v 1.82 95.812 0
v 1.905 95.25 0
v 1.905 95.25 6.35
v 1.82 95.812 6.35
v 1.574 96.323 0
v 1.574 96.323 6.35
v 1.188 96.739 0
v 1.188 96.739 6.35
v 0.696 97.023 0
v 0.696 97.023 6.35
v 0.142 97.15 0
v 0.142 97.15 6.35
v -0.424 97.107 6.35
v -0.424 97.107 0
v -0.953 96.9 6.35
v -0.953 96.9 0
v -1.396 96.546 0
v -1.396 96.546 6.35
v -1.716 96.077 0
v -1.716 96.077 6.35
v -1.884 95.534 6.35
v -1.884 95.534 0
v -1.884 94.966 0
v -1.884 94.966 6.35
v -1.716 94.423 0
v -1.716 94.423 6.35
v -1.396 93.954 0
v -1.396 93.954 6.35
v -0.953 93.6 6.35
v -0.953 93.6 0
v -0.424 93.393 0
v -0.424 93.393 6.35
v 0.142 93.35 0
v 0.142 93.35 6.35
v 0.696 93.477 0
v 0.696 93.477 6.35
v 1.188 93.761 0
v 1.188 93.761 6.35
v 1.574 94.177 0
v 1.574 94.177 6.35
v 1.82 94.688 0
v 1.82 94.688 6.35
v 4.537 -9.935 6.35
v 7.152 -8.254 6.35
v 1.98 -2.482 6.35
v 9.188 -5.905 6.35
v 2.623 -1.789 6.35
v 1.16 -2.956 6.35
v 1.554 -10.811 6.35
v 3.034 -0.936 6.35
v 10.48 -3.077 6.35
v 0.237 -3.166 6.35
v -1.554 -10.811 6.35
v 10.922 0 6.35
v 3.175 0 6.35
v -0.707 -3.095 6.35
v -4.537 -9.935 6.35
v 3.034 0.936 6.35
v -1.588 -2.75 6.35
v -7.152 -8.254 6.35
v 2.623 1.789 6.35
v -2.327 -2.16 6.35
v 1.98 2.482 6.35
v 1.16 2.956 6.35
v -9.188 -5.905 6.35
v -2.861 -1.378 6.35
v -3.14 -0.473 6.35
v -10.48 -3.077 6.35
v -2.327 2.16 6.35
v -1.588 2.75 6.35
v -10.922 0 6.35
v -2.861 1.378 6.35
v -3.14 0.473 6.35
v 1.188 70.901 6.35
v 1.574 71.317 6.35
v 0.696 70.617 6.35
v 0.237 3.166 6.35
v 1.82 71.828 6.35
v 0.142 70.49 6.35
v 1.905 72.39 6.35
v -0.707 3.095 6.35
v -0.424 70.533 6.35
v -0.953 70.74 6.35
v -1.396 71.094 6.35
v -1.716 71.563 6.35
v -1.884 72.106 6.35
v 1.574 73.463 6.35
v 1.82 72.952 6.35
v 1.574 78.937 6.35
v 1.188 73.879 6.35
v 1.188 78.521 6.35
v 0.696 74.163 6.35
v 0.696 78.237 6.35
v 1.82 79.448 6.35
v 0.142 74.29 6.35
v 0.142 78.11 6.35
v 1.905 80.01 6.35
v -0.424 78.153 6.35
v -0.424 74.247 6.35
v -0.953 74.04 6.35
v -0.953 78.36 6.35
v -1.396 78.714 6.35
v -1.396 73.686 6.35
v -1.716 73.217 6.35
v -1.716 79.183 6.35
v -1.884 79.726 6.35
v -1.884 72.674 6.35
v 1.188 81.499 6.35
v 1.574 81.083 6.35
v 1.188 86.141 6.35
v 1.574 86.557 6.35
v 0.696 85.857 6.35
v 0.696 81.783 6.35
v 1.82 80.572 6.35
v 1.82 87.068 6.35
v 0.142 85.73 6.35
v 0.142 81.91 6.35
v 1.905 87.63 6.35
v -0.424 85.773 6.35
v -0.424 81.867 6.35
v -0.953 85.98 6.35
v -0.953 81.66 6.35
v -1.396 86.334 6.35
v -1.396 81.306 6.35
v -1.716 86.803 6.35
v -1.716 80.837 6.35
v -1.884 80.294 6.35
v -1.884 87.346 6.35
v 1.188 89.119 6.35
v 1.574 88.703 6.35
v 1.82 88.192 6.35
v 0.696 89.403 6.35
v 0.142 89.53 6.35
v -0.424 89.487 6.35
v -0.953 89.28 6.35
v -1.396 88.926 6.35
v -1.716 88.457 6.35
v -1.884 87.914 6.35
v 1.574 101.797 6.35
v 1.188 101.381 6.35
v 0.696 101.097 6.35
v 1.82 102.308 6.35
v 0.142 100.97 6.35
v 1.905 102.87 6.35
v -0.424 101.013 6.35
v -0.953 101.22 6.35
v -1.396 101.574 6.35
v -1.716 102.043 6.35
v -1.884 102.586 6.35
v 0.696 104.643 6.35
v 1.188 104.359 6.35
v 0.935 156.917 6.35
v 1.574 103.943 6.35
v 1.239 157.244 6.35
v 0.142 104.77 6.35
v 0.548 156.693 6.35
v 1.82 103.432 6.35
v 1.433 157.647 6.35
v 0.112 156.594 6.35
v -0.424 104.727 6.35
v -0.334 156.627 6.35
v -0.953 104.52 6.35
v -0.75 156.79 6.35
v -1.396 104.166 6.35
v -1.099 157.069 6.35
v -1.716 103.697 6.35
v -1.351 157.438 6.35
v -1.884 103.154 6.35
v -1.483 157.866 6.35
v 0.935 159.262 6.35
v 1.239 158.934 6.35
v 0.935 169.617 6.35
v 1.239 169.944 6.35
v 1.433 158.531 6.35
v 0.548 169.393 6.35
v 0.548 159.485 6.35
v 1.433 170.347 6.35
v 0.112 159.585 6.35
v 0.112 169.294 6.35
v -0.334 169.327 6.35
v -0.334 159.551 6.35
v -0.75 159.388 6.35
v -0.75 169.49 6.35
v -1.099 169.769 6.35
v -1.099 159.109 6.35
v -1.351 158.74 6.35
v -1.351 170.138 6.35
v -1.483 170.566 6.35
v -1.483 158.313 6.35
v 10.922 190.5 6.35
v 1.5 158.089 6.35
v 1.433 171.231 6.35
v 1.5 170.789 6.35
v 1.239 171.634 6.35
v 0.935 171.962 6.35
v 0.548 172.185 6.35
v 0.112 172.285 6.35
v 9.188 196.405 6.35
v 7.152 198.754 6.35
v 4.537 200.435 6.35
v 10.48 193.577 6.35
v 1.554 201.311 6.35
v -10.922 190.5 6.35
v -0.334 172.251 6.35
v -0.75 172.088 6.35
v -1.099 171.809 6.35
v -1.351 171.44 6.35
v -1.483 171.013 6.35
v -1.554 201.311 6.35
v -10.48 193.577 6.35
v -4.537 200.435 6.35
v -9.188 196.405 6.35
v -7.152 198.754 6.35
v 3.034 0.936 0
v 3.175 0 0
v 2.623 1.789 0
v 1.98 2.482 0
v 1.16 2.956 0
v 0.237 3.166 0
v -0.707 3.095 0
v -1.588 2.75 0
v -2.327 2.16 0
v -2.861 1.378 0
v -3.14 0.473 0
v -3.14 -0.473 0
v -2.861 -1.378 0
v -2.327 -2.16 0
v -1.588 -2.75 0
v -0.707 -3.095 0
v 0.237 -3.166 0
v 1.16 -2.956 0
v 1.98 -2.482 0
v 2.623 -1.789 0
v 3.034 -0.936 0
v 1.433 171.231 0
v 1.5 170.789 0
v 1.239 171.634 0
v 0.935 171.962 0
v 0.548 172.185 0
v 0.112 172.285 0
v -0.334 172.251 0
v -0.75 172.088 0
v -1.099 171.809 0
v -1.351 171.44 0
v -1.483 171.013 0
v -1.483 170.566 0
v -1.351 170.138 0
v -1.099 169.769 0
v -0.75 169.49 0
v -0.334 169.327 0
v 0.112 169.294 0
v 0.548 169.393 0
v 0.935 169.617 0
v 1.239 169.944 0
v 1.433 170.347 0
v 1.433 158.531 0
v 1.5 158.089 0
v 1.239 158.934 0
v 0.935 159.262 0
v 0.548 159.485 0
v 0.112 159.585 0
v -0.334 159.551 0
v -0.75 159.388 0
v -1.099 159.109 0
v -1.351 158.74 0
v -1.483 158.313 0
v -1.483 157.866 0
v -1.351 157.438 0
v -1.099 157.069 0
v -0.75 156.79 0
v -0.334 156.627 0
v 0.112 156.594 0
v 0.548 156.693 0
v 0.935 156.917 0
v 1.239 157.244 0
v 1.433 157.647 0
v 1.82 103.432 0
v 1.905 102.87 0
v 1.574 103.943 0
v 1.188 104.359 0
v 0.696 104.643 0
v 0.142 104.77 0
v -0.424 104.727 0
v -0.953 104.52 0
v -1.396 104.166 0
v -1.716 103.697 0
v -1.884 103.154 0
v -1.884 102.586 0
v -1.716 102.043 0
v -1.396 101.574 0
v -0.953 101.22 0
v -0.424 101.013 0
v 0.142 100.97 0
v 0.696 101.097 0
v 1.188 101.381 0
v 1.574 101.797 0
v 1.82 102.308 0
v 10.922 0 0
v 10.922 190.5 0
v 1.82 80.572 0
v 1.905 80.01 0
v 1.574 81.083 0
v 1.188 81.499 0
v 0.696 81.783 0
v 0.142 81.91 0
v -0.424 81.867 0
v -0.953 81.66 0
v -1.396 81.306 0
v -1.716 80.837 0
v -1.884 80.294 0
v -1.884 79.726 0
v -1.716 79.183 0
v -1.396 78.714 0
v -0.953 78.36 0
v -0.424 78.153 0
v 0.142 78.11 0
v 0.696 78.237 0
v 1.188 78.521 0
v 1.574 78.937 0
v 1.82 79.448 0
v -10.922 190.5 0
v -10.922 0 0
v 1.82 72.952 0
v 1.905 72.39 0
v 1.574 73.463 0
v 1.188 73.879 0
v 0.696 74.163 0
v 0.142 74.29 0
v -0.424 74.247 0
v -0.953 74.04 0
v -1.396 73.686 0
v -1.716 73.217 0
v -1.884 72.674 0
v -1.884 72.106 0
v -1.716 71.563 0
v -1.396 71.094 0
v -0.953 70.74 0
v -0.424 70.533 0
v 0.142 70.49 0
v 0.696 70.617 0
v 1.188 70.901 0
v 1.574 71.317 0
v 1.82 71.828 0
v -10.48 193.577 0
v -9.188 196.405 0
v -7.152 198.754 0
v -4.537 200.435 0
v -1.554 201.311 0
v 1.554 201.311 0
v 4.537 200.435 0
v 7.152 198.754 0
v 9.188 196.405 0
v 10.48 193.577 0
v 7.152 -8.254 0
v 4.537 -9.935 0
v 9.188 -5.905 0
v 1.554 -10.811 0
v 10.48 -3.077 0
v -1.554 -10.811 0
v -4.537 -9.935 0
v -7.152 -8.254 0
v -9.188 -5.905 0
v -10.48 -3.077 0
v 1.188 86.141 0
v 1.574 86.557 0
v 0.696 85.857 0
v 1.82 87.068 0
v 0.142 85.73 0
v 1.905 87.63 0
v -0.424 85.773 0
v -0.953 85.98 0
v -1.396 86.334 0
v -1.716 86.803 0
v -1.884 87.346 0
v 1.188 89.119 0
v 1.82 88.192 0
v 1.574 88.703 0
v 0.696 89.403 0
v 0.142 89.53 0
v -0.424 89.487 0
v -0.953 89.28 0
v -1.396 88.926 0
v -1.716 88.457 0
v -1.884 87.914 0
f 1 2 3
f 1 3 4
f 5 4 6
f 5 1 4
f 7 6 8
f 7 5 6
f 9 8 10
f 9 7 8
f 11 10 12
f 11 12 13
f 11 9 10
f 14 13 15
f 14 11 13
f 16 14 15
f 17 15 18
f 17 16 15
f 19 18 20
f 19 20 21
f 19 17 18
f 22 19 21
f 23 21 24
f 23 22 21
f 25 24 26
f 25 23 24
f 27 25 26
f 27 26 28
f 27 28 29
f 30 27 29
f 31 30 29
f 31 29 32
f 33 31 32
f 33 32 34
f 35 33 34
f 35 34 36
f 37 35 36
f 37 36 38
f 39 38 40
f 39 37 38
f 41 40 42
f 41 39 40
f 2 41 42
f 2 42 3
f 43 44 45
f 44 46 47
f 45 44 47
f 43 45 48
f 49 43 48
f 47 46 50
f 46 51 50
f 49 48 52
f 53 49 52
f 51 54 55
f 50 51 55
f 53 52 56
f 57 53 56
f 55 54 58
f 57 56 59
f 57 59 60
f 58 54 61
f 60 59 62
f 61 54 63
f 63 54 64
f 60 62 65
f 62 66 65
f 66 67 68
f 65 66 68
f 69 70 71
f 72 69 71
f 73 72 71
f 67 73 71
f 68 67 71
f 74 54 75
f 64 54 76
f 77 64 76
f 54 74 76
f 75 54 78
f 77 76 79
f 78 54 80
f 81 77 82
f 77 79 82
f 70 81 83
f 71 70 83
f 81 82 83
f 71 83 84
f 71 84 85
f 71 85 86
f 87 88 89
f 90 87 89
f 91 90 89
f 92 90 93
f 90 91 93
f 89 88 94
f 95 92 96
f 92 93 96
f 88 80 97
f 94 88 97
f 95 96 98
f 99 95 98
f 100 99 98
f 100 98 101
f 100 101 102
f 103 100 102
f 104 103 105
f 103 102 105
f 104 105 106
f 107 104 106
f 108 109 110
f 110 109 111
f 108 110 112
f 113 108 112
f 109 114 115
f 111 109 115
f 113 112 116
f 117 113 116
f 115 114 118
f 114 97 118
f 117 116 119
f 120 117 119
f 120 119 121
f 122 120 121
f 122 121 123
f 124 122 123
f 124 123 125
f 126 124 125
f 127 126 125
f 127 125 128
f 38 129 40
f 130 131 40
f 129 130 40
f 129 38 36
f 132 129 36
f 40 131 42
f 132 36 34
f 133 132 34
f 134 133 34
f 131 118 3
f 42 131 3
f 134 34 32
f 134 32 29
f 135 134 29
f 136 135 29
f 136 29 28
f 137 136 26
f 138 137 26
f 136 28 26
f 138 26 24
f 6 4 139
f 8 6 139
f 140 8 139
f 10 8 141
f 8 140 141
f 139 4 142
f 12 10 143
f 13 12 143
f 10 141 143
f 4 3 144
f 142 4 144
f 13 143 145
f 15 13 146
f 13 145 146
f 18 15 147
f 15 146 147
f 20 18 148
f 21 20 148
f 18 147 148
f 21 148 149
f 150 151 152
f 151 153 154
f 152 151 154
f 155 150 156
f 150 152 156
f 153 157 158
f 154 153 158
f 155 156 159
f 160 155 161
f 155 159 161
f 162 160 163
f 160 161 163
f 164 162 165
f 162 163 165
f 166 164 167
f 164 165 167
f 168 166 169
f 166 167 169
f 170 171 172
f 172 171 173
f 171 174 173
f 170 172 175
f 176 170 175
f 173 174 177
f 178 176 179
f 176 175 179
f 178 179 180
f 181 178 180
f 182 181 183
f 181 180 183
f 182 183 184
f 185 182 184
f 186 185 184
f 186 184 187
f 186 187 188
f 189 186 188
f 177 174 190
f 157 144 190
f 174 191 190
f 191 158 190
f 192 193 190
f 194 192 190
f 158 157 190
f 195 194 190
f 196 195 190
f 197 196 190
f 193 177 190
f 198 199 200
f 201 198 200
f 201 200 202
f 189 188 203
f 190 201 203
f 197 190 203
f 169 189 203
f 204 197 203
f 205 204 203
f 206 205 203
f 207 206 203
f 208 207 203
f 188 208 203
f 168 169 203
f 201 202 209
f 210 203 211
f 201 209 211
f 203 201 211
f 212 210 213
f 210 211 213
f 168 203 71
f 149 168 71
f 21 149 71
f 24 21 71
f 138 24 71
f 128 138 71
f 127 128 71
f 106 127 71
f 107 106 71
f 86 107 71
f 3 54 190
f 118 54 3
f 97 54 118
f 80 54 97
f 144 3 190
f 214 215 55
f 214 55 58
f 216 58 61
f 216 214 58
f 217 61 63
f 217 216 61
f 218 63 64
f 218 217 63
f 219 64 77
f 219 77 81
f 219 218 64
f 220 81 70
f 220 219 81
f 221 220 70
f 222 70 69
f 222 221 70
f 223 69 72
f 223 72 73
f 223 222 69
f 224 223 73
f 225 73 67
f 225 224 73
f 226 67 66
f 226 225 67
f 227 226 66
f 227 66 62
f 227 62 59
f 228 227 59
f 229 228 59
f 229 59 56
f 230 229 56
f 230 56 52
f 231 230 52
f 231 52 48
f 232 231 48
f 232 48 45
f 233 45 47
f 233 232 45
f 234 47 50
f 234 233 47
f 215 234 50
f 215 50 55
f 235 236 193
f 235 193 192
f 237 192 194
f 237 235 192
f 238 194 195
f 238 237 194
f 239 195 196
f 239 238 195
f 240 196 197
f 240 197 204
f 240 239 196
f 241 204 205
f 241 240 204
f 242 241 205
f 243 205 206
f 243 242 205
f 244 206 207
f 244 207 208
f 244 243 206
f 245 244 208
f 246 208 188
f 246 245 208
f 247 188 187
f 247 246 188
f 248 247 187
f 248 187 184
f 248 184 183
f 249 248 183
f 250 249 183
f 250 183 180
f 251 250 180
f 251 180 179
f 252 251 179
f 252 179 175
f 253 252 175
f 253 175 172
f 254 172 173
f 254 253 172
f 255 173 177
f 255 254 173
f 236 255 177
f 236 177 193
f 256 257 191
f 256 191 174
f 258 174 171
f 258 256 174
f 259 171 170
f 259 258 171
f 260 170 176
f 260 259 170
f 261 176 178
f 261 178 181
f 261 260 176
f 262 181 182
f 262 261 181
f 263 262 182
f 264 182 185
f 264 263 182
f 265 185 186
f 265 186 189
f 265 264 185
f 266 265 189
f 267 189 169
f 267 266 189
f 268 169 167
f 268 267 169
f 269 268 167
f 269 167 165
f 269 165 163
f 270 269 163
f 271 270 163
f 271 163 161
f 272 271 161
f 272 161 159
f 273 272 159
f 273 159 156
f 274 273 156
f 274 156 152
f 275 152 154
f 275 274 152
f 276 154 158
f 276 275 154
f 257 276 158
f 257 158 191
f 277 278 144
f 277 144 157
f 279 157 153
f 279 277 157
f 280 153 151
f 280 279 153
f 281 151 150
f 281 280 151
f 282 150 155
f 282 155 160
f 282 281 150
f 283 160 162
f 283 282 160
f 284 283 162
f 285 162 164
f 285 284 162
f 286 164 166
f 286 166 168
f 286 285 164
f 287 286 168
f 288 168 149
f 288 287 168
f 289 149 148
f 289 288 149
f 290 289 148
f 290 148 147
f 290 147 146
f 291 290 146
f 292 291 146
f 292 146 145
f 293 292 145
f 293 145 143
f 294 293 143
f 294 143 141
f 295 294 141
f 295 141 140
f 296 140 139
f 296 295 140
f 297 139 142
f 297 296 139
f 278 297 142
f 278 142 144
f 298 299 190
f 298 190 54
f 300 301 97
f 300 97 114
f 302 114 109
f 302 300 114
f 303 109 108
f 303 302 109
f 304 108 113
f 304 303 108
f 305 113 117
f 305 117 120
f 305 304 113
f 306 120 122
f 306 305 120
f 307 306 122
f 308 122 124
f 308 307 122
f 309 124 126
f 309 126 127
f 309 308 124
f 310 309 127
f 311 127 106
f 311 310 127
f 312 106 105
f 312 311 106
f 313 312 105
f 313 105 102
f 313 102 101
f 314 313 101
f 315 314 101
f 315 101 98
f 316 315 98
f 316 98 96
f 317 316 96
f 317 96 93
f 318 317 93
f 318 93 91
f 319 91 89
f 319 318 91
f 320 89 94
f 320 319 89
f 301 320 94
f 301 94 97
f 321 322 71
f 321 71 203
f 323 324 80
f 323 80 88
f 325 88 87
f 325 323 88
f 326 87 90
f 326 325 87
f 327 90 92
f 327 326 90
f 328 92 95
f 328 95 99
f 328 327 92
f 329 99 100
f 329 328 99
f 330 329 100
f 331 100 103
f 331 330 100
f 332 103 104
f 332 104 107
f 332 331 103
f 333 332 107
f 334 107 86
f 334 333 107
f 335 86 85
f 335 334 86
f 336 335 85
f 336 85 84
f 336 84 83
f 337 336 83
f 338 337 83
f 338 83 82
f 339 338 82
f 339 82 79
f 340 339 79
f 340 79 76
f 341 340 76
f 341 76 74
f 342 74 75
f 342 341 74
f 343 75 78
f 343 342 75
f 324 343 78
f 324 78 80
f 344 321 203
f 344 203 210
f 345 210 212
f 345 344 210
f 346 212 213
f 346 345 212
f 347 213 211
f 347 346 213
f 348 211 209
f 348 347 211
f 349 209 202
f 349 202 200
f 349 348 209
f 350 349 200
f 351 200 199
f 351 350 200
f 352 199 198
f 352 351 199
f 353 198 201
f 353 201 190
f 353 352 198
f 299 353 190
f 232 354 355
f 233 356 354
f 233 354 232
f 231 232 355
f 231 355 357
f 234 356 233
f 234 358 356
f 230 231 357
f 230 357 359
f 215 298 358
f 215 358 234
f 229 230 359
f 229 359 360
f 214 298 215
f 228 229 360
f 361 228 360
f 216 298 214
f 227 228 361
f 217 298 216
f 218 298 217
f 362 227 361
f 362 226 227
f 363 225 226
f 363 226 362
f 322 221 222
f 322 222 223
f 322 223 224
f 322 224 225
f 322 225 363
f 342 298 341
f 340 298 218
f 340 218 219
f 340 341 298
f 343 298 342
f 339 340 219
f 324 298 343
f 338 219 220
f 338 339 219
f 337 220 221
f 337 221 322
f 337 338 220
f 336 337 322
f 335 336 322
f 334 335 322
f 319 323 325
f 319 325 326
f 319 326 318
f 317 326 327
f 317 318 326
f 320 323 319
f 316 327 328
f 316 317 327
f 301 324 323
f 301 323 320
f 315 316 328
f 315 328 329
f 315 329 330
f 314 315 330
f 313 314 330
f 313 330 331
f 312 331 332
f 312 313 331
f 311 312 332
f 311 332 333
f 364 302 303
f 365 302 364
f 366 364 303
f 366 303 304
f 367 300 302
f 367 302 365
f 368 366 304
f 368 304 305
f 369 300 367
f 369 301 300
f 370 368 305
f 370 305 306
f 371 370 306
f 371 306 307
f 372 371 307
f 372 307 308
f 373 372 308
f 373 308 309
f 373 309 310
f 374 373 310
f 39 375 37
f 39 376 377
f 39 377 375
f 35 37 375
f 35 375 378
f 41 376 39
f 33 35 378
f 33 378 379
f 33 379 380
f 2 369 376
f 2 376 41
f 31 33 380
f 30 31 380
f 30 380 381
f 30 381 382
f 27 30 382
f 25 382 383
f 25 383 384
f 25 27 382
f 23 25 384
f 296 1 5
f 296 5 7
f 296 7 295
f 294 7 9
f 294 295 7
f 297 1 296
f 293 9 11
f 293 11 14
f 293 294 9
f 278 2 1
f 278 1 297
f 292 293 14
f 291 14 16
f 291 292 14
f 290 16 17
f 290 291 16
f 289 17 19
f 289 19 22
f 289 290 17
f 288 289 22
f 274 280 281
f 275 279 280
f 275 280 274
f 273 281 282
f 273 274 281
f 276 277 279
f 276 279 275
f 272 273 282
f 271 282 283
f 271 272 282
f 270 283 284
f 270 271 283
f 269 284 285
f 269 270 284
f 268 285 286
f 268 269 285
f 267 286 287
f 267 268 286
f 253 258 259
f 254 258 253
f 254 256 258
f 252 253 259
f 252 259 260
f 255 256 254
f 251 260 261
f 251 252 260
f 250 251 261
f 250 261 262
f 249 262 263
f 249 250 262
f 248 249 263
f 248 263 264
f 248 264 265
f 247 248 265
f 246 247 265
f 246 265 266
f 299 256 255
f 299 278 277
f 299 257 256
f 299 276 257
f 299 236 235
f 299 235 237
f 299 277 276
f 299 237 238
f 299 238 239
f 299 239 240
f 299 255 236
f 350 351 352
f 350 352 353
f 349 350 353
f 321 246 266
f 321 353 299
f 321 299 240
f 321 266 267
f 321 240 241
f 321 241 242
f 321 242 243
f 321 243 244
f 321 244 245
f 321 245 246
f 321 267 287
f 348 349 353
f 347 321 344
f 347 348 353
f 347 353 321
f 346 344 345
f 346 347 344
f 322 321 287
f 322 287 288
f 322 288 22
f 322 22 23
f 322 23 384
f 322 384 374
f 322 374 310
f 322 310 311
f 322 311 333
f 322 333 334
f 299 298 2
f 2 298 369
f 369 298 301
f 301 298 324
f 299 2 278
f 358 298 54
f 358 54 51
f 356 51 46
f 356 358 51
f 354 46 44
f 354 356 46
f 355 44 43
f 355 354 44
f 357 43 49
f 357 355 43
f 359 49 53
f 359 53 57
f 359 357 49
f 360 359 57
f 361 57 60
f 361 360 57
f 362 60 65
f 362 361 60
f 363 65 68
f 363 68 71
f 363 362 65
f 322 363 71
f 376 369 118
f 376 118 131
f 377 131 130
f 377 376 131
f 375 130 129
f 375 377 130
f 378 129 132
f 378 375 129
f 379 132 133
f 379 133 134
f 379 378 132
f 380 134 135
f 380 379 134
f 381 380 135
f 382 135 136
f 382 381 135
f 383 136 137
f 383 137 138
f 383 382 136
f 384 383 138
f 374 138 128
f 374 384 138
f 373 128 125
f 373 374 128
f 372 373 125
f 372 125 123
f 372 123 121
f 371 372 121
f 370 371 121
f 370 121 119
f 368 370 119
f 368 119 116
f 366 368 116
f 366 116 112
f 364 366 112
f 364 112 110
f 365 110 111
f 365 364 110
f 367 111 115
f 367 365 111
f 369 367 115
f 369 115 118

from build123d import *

# Parameters (mm, degrees)
SKETCH1_R           = 3.175
SKETCH1_R_2         = 1.905
SKETCH1_R_3         = 1.49987
BOSS_EXTRUDE1_DEPTH = 6.35


with BuildPart() as part:
    # Sketch1 → Boss-Extrude1 (new body)
    with BuildSketch(Plane.XY):
        with BuildLine():
            Line((-10.922, 0), (-10.922, 190.5))
            ThreePointArc((-10.922, 190.5), (0, 201.422), (10.922, 190.5))
            Line((10.922, 190.5), (10.922, 0))
            ThreePointArc((10.922, 0), (0, -10.922), (-10.922, 0))
        make_face()
        Circle(SKETCH1_R, mode=Mode.SUBTRACT)
        with Locations((0, 95.25)):
            Circle(SKETCH1_R_2, mode=Mode.SUBTRACT)
        with Locations((0, 87.63)):
            Circle(SKETCH1_R_2, mode=Mode.SUBTRACT)
        with Locations((0, 80.01)):
            Circle(SKETCH1_R_2, mode=Mode.SUBTRACT)
        with Locations((0, 72.39)):
            Circle(SKETCH1_R_2, mode=Mode.SUBTRACT)
        with Locations((0, 102.87)):
            Circle(SKETCH1_R_2, mode=Mode.SUBTRACT)
        with Locations((0, 170.789184136)):
            Circle(SKETCH1_R_3, mode=Mode.SUBTRACT)
        with Locations((0, 158.089184136)):
            Circle(SKETCH1_R_3, mode=Mode.SUBTRACT)
    extrude(amount=BOSS_EXTRUDE1_DEPTH)


solid = part.part
